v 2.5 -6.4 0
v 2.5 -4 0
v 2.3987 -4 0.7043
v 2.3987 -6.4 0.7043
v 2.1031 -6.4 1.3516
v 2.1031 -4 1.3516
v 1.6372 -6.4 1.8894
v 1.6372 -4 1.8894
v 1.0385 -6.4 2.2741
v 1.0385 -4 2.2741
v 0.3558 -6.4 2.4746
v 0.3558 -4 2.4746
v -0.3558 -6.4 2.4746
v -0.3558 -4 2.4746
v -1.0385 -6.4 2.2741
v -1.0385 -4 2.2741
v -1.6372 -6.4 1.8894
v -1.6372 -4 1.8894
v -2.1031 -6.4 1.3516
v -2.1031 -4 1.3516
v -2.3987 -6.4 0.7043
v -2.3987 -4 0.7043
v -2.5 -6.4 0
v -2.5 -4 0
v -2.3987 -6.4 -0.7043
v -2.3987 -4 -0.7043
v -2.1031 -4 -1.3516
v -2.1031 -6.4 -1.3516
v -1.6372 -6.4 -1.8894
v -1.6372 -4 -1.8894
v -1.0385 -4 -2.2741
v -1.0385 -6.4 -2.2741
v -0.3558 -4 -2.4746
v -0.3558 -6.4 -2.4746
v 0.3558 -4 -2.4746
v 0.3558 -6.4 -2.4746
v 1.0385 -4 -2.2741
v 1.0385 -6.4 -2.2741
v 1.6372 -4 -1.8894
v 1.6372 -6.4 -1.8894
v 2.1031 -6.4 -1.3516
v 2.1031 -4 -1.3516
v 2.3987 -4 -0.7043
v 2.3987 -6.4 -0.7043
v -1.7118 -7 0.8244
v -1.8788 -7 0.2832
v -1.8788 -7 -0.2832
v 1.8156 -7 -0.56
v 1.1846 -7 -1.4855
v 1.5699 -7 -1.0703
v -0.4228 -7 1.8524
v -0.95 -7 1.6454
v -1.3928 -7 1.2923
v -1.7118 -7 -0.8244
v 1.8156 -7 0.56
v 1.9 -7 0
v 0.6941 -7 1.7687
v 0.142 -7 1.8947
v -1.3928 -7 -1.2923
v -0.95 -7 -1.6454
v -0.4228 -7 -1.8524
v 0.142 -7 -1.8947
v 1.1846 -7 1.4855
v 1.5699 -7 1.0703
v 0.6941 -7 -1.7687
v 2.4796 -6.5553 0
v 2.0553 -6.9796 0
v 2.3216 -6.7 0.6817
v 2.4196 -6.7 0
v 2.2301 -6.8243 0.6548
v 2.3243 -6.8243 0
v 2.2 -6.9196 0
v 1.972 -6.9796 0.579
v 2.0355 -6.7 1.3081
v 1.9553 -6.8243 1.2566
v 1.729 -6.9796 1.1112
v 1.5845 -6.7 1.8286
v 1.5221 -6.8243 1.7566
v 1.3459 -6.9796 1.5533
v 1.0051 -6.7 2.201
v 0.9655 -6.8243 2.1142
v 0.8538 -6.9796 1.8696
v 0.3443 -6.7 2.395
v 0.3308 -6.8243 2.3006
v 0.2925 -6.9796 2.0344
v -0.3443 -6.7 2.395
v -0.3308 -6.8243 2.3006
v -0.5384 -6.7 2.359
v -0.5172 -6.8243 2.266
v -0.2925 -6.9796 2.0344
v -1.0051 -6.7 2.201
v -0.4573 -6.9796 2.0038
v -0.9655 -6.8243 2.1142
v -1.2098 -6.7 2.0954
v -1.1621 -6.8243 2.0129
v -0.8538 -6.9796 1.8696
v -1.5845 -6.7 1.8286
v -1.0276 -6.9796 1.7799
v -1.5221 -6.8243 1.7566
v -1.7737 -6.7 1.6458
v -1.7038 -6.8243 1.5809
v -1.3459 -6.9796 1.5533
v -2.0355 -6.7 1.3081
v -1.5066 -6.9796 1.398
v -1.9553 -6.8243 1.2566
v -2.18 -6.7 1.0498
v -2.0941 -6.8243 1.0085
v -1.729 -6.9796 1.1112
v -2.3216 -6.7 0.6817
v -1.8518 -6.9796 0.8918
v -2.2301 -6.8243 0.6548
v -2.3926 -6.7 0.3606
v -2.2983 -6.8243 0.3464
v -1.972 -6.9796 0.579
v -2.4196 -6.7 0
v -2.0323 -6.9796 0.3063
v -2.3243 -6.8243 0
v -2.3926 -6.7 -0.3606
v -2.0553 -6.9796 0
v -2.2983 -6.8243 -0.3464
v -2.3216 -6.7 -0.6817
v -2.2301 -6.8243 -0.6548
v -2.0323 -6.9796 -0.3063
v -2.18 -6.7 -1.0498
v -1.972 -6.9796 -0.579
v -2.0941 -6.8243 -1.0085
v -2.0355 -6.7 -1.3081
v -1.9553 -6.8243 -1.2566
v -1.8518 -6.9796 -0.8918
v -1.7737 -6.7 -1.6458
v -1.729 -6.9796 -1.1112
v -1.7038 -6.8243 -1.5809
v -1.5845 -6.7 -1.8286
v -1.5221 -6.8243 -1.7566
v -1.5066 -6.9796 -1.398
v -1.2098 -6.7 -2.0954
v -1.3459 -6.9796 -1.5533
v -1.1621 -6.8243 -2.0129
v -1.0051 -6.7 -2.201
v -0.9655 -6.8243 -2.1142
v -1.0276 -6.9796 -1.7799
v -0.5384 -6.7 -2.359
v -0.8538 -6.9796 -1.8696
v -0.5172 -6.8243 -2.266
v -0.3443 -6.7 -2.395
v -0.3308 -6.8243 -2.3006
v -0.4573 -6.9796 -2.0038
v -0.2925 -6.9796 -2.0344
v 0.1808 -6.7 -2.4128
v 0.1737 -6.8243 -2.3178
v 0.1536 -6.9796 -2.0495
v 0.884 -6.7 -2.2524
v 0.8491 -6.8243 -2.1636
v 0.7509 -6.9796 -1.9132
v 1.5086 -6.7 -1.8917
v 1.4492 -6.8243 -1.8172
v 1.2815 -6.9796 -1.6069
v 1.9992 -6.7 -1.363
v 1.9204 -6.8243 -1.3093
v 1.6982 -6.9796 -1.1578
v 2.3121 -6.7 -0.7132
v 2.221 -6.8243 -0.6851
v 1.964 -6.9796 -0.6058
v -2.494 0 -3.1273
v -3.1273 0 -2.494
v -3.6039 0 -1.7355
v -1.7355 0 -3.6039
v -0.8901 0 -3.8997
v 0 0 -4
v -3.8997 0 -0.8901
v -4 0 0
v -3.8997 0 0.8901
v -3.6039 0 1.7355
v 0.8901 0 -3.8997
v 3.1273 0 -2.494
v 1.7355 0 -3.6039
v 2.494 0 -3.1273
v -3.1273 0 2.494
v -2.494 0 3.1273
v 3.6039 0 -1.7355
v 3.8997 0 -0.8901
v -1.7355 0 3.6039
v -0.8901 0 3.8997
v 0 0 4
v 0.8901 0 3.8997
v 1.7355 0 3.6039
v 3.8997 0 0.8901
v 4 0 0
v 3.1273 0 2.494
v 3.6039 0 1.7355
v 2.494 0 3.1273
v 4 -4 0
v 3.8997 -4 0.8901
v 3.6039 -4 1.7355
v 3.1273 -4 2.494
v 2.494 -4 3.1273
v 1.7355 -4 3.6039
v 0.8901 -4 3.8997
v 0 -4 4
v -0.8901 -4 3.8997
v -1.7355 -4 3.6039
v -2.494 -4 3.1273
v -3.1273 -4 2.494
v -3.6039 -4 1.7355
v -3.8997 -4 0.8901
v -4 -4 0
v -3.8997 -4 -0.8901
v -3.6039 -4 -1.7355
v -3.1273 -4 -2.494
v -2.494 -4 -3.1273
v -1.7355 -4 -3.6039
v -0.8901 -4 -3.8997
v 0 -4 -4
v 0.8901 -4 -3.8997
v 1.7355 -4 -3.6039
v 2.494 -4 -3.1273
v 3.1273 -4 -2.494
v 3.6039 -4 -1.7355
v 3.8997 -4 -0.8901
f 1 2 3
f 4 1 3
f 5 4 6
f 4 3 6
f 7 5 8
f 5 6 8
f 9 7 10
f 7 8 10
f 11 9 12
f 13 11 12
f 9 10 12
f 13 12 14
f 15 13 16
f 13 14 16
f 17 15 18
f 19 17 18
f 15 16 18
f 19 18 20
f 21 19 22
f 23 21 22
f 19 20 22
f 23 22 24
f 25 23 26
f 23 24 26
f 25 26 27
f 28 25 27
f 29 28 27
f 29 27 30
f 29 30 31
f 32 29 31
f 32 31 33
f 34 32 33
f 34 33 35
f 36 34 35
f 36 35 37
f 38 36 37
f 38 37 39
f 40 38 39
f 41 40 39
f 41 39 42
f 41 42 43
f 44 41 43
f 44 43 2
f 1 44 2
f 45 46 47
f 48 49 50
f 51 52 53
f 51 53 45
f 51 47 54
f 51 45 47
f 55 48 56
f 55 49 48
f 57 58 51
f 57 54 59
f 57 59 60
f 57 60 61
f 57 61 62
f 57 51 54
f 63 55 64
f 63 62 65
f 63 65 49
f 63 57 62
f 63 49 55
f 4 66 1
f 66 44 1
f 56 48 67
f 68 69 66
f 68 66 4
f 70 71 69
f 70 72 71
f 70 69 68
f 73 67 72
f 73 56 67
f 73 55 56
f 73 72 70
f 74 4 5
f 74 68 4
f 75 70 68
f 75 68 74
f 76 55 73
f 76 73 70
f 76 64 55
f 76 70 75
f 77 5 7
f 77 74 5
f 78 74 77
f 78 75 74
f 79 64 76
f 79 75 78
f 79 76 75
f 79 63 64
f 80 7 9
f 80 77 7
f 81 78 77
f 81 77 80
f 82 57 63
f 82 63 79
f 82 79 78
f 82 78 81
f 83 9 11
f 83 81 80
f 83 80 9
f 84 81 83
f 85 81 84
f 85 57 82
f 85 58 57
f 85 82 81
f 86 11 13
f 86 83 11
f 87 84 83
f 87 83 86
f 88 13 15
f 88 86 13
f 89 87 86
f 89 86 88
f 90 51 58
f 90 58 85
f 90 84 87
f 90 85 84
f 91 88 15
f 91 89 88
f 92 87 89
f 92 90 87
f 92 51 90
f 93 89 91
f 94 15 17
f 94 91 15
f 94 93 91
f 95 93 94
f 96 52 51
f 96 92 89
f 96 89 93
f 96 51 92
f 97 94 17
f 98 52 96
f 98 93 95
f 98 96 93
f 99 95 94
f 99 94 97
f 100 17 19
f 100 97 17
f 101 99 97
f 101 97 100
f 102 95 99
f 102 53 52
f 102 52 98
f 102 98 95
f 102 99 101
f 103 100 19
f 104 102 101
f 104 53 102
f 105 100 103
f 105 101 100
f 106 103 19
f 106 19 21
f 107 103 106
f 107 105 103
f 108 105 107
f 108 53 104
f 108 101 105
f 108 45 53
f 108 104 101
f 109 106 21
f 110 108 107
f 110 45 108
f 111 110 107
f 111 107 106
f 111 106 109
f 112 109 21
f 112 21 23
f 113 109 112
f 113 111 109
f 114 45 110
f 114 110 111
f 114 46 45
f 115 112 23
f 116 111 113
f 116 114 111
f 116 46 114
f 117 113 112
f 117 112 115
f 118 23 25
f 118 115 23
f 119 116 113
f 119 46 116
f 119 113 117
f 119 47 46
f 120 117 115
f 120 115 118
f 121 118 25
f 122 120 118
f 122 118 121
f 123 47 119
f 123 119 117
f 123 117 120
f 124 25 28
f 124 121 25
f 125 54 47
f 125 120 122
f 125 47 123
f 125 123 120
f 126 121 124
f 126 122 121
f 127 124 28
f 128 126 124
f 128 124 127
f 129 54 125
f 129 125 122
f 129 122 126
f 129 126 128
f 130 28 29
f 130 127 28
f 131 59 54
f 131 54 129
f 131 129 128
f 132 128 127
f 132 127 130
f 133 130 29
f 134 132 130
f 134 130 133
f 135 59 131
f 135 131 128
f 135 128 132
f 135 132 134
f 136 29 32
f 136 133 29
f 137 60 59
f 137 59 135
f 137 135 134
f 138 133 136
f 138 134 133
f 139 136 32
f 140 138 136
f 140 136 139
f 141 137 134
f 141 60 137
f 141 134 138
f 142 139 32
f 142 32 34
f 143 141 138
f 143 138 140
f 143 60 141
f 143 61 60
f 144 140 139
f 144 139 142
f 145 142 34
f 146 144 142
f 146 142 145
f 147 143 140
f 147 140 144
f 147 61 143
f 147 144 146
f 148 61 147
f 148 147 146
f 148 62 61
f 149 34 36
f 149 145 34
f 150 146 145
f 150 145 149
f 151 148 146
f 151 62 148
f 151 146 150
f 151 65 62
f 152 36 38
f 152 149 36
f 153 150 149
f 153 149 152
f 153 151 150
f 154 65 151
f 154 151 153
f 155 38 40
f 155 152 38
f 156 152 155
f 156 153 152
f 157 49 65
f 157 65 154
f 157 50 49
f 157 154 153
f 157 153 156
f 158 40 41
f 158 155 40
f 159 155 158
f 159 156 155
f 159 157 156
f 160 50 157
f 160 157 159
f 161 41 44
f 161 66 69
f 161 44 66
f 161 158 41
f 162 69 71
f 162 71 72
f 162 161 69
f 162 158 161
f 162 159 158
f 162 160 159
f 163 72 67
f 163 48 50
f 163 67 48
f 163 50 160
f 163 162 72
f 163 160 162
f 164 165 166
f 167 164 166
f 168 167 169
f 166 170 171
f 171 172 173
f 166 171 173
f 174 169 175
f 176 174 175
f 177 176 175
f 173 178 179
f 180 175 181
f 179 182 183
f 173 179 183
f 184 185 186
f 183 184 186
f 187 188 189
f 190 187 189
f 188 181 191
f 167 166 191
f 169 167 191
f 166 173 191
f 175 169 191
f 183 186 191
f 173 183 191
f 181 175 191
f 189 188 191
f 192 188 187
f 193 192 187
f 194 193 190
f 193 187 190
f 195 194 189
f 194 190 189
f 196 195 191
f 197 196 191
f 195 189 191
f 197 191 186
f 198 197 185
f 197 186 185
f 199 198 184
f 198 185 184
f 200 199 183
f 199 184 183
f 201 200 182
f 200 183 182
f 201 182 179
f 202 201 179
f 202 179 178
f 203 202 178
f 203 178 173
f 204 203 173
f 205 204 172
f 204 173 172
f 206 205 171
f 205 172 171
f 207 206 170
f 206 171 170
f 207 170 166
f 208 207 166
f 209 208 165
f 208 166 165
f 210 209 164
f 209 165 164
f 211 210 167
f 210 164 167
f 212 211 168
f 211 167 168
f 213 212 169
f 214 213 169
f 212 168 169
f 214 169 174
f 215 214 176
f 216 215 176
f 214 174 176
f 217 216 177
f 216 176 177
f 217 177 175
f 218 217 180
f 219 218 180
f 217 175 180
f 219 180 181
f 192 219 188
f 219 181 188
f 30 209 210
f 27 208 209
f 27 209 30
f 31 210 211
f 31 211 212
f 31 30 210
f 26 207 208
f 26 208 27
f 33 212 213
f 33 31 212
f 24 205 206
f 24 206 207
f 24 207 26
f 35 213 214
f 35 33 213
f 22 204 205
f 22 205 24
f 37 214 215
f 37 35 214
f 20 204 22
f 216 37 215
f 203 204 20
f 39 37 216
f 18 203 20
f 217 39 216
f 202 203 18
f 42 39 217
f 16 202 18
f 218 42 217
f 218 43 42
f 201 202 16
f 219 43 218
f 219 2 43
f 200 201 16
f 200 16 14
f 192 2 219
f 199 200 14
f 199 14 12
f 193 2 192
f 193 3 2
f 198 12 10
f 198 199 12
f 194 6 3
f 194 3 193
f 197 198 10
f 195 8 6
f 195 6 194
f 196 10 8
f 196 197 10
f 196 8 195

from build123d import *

# Parameters (mm, degrees)
F0_R     = 1.65
F1_DEPTH = 7
F0_R_2   = 2.5
F2_DEPTH = 7
F0_R_3   = 4
F3_DEPTH = 4
F4_R     = 0.6


with BuildPart() as f1:
    # F0 (on Front) → F1 (new body)
    with BuildSketch(Plane.XZ):
        Circle(F0_R)
    extrude(amount=F1_DEPTH)

    # F0 (on Front) → F2 (join)
    with BuildSketch(Plane.XZ):
        Circle(F0_R_2)
        Circle(F0_R, mode=Mode.SUBTRACT)
    extrude(amount=F2_DEPTH)

    # F0 (on Front) → F3 (join)
    with BuildSketch(Plane.XZ):
        Circle(F0_R_3)
        Circle(F0_R_2, mode=Mode.SUBTRACT)
    extrude(amount=F3_DEPTH)

    # F4
    f4_edges = [f1.edges().sort_by_distance(p)[0] for p in [
        (-2.5, -7, 0),
    ]]
    fillet(f4_edges, radius=F4_R)


solid = f1.part
